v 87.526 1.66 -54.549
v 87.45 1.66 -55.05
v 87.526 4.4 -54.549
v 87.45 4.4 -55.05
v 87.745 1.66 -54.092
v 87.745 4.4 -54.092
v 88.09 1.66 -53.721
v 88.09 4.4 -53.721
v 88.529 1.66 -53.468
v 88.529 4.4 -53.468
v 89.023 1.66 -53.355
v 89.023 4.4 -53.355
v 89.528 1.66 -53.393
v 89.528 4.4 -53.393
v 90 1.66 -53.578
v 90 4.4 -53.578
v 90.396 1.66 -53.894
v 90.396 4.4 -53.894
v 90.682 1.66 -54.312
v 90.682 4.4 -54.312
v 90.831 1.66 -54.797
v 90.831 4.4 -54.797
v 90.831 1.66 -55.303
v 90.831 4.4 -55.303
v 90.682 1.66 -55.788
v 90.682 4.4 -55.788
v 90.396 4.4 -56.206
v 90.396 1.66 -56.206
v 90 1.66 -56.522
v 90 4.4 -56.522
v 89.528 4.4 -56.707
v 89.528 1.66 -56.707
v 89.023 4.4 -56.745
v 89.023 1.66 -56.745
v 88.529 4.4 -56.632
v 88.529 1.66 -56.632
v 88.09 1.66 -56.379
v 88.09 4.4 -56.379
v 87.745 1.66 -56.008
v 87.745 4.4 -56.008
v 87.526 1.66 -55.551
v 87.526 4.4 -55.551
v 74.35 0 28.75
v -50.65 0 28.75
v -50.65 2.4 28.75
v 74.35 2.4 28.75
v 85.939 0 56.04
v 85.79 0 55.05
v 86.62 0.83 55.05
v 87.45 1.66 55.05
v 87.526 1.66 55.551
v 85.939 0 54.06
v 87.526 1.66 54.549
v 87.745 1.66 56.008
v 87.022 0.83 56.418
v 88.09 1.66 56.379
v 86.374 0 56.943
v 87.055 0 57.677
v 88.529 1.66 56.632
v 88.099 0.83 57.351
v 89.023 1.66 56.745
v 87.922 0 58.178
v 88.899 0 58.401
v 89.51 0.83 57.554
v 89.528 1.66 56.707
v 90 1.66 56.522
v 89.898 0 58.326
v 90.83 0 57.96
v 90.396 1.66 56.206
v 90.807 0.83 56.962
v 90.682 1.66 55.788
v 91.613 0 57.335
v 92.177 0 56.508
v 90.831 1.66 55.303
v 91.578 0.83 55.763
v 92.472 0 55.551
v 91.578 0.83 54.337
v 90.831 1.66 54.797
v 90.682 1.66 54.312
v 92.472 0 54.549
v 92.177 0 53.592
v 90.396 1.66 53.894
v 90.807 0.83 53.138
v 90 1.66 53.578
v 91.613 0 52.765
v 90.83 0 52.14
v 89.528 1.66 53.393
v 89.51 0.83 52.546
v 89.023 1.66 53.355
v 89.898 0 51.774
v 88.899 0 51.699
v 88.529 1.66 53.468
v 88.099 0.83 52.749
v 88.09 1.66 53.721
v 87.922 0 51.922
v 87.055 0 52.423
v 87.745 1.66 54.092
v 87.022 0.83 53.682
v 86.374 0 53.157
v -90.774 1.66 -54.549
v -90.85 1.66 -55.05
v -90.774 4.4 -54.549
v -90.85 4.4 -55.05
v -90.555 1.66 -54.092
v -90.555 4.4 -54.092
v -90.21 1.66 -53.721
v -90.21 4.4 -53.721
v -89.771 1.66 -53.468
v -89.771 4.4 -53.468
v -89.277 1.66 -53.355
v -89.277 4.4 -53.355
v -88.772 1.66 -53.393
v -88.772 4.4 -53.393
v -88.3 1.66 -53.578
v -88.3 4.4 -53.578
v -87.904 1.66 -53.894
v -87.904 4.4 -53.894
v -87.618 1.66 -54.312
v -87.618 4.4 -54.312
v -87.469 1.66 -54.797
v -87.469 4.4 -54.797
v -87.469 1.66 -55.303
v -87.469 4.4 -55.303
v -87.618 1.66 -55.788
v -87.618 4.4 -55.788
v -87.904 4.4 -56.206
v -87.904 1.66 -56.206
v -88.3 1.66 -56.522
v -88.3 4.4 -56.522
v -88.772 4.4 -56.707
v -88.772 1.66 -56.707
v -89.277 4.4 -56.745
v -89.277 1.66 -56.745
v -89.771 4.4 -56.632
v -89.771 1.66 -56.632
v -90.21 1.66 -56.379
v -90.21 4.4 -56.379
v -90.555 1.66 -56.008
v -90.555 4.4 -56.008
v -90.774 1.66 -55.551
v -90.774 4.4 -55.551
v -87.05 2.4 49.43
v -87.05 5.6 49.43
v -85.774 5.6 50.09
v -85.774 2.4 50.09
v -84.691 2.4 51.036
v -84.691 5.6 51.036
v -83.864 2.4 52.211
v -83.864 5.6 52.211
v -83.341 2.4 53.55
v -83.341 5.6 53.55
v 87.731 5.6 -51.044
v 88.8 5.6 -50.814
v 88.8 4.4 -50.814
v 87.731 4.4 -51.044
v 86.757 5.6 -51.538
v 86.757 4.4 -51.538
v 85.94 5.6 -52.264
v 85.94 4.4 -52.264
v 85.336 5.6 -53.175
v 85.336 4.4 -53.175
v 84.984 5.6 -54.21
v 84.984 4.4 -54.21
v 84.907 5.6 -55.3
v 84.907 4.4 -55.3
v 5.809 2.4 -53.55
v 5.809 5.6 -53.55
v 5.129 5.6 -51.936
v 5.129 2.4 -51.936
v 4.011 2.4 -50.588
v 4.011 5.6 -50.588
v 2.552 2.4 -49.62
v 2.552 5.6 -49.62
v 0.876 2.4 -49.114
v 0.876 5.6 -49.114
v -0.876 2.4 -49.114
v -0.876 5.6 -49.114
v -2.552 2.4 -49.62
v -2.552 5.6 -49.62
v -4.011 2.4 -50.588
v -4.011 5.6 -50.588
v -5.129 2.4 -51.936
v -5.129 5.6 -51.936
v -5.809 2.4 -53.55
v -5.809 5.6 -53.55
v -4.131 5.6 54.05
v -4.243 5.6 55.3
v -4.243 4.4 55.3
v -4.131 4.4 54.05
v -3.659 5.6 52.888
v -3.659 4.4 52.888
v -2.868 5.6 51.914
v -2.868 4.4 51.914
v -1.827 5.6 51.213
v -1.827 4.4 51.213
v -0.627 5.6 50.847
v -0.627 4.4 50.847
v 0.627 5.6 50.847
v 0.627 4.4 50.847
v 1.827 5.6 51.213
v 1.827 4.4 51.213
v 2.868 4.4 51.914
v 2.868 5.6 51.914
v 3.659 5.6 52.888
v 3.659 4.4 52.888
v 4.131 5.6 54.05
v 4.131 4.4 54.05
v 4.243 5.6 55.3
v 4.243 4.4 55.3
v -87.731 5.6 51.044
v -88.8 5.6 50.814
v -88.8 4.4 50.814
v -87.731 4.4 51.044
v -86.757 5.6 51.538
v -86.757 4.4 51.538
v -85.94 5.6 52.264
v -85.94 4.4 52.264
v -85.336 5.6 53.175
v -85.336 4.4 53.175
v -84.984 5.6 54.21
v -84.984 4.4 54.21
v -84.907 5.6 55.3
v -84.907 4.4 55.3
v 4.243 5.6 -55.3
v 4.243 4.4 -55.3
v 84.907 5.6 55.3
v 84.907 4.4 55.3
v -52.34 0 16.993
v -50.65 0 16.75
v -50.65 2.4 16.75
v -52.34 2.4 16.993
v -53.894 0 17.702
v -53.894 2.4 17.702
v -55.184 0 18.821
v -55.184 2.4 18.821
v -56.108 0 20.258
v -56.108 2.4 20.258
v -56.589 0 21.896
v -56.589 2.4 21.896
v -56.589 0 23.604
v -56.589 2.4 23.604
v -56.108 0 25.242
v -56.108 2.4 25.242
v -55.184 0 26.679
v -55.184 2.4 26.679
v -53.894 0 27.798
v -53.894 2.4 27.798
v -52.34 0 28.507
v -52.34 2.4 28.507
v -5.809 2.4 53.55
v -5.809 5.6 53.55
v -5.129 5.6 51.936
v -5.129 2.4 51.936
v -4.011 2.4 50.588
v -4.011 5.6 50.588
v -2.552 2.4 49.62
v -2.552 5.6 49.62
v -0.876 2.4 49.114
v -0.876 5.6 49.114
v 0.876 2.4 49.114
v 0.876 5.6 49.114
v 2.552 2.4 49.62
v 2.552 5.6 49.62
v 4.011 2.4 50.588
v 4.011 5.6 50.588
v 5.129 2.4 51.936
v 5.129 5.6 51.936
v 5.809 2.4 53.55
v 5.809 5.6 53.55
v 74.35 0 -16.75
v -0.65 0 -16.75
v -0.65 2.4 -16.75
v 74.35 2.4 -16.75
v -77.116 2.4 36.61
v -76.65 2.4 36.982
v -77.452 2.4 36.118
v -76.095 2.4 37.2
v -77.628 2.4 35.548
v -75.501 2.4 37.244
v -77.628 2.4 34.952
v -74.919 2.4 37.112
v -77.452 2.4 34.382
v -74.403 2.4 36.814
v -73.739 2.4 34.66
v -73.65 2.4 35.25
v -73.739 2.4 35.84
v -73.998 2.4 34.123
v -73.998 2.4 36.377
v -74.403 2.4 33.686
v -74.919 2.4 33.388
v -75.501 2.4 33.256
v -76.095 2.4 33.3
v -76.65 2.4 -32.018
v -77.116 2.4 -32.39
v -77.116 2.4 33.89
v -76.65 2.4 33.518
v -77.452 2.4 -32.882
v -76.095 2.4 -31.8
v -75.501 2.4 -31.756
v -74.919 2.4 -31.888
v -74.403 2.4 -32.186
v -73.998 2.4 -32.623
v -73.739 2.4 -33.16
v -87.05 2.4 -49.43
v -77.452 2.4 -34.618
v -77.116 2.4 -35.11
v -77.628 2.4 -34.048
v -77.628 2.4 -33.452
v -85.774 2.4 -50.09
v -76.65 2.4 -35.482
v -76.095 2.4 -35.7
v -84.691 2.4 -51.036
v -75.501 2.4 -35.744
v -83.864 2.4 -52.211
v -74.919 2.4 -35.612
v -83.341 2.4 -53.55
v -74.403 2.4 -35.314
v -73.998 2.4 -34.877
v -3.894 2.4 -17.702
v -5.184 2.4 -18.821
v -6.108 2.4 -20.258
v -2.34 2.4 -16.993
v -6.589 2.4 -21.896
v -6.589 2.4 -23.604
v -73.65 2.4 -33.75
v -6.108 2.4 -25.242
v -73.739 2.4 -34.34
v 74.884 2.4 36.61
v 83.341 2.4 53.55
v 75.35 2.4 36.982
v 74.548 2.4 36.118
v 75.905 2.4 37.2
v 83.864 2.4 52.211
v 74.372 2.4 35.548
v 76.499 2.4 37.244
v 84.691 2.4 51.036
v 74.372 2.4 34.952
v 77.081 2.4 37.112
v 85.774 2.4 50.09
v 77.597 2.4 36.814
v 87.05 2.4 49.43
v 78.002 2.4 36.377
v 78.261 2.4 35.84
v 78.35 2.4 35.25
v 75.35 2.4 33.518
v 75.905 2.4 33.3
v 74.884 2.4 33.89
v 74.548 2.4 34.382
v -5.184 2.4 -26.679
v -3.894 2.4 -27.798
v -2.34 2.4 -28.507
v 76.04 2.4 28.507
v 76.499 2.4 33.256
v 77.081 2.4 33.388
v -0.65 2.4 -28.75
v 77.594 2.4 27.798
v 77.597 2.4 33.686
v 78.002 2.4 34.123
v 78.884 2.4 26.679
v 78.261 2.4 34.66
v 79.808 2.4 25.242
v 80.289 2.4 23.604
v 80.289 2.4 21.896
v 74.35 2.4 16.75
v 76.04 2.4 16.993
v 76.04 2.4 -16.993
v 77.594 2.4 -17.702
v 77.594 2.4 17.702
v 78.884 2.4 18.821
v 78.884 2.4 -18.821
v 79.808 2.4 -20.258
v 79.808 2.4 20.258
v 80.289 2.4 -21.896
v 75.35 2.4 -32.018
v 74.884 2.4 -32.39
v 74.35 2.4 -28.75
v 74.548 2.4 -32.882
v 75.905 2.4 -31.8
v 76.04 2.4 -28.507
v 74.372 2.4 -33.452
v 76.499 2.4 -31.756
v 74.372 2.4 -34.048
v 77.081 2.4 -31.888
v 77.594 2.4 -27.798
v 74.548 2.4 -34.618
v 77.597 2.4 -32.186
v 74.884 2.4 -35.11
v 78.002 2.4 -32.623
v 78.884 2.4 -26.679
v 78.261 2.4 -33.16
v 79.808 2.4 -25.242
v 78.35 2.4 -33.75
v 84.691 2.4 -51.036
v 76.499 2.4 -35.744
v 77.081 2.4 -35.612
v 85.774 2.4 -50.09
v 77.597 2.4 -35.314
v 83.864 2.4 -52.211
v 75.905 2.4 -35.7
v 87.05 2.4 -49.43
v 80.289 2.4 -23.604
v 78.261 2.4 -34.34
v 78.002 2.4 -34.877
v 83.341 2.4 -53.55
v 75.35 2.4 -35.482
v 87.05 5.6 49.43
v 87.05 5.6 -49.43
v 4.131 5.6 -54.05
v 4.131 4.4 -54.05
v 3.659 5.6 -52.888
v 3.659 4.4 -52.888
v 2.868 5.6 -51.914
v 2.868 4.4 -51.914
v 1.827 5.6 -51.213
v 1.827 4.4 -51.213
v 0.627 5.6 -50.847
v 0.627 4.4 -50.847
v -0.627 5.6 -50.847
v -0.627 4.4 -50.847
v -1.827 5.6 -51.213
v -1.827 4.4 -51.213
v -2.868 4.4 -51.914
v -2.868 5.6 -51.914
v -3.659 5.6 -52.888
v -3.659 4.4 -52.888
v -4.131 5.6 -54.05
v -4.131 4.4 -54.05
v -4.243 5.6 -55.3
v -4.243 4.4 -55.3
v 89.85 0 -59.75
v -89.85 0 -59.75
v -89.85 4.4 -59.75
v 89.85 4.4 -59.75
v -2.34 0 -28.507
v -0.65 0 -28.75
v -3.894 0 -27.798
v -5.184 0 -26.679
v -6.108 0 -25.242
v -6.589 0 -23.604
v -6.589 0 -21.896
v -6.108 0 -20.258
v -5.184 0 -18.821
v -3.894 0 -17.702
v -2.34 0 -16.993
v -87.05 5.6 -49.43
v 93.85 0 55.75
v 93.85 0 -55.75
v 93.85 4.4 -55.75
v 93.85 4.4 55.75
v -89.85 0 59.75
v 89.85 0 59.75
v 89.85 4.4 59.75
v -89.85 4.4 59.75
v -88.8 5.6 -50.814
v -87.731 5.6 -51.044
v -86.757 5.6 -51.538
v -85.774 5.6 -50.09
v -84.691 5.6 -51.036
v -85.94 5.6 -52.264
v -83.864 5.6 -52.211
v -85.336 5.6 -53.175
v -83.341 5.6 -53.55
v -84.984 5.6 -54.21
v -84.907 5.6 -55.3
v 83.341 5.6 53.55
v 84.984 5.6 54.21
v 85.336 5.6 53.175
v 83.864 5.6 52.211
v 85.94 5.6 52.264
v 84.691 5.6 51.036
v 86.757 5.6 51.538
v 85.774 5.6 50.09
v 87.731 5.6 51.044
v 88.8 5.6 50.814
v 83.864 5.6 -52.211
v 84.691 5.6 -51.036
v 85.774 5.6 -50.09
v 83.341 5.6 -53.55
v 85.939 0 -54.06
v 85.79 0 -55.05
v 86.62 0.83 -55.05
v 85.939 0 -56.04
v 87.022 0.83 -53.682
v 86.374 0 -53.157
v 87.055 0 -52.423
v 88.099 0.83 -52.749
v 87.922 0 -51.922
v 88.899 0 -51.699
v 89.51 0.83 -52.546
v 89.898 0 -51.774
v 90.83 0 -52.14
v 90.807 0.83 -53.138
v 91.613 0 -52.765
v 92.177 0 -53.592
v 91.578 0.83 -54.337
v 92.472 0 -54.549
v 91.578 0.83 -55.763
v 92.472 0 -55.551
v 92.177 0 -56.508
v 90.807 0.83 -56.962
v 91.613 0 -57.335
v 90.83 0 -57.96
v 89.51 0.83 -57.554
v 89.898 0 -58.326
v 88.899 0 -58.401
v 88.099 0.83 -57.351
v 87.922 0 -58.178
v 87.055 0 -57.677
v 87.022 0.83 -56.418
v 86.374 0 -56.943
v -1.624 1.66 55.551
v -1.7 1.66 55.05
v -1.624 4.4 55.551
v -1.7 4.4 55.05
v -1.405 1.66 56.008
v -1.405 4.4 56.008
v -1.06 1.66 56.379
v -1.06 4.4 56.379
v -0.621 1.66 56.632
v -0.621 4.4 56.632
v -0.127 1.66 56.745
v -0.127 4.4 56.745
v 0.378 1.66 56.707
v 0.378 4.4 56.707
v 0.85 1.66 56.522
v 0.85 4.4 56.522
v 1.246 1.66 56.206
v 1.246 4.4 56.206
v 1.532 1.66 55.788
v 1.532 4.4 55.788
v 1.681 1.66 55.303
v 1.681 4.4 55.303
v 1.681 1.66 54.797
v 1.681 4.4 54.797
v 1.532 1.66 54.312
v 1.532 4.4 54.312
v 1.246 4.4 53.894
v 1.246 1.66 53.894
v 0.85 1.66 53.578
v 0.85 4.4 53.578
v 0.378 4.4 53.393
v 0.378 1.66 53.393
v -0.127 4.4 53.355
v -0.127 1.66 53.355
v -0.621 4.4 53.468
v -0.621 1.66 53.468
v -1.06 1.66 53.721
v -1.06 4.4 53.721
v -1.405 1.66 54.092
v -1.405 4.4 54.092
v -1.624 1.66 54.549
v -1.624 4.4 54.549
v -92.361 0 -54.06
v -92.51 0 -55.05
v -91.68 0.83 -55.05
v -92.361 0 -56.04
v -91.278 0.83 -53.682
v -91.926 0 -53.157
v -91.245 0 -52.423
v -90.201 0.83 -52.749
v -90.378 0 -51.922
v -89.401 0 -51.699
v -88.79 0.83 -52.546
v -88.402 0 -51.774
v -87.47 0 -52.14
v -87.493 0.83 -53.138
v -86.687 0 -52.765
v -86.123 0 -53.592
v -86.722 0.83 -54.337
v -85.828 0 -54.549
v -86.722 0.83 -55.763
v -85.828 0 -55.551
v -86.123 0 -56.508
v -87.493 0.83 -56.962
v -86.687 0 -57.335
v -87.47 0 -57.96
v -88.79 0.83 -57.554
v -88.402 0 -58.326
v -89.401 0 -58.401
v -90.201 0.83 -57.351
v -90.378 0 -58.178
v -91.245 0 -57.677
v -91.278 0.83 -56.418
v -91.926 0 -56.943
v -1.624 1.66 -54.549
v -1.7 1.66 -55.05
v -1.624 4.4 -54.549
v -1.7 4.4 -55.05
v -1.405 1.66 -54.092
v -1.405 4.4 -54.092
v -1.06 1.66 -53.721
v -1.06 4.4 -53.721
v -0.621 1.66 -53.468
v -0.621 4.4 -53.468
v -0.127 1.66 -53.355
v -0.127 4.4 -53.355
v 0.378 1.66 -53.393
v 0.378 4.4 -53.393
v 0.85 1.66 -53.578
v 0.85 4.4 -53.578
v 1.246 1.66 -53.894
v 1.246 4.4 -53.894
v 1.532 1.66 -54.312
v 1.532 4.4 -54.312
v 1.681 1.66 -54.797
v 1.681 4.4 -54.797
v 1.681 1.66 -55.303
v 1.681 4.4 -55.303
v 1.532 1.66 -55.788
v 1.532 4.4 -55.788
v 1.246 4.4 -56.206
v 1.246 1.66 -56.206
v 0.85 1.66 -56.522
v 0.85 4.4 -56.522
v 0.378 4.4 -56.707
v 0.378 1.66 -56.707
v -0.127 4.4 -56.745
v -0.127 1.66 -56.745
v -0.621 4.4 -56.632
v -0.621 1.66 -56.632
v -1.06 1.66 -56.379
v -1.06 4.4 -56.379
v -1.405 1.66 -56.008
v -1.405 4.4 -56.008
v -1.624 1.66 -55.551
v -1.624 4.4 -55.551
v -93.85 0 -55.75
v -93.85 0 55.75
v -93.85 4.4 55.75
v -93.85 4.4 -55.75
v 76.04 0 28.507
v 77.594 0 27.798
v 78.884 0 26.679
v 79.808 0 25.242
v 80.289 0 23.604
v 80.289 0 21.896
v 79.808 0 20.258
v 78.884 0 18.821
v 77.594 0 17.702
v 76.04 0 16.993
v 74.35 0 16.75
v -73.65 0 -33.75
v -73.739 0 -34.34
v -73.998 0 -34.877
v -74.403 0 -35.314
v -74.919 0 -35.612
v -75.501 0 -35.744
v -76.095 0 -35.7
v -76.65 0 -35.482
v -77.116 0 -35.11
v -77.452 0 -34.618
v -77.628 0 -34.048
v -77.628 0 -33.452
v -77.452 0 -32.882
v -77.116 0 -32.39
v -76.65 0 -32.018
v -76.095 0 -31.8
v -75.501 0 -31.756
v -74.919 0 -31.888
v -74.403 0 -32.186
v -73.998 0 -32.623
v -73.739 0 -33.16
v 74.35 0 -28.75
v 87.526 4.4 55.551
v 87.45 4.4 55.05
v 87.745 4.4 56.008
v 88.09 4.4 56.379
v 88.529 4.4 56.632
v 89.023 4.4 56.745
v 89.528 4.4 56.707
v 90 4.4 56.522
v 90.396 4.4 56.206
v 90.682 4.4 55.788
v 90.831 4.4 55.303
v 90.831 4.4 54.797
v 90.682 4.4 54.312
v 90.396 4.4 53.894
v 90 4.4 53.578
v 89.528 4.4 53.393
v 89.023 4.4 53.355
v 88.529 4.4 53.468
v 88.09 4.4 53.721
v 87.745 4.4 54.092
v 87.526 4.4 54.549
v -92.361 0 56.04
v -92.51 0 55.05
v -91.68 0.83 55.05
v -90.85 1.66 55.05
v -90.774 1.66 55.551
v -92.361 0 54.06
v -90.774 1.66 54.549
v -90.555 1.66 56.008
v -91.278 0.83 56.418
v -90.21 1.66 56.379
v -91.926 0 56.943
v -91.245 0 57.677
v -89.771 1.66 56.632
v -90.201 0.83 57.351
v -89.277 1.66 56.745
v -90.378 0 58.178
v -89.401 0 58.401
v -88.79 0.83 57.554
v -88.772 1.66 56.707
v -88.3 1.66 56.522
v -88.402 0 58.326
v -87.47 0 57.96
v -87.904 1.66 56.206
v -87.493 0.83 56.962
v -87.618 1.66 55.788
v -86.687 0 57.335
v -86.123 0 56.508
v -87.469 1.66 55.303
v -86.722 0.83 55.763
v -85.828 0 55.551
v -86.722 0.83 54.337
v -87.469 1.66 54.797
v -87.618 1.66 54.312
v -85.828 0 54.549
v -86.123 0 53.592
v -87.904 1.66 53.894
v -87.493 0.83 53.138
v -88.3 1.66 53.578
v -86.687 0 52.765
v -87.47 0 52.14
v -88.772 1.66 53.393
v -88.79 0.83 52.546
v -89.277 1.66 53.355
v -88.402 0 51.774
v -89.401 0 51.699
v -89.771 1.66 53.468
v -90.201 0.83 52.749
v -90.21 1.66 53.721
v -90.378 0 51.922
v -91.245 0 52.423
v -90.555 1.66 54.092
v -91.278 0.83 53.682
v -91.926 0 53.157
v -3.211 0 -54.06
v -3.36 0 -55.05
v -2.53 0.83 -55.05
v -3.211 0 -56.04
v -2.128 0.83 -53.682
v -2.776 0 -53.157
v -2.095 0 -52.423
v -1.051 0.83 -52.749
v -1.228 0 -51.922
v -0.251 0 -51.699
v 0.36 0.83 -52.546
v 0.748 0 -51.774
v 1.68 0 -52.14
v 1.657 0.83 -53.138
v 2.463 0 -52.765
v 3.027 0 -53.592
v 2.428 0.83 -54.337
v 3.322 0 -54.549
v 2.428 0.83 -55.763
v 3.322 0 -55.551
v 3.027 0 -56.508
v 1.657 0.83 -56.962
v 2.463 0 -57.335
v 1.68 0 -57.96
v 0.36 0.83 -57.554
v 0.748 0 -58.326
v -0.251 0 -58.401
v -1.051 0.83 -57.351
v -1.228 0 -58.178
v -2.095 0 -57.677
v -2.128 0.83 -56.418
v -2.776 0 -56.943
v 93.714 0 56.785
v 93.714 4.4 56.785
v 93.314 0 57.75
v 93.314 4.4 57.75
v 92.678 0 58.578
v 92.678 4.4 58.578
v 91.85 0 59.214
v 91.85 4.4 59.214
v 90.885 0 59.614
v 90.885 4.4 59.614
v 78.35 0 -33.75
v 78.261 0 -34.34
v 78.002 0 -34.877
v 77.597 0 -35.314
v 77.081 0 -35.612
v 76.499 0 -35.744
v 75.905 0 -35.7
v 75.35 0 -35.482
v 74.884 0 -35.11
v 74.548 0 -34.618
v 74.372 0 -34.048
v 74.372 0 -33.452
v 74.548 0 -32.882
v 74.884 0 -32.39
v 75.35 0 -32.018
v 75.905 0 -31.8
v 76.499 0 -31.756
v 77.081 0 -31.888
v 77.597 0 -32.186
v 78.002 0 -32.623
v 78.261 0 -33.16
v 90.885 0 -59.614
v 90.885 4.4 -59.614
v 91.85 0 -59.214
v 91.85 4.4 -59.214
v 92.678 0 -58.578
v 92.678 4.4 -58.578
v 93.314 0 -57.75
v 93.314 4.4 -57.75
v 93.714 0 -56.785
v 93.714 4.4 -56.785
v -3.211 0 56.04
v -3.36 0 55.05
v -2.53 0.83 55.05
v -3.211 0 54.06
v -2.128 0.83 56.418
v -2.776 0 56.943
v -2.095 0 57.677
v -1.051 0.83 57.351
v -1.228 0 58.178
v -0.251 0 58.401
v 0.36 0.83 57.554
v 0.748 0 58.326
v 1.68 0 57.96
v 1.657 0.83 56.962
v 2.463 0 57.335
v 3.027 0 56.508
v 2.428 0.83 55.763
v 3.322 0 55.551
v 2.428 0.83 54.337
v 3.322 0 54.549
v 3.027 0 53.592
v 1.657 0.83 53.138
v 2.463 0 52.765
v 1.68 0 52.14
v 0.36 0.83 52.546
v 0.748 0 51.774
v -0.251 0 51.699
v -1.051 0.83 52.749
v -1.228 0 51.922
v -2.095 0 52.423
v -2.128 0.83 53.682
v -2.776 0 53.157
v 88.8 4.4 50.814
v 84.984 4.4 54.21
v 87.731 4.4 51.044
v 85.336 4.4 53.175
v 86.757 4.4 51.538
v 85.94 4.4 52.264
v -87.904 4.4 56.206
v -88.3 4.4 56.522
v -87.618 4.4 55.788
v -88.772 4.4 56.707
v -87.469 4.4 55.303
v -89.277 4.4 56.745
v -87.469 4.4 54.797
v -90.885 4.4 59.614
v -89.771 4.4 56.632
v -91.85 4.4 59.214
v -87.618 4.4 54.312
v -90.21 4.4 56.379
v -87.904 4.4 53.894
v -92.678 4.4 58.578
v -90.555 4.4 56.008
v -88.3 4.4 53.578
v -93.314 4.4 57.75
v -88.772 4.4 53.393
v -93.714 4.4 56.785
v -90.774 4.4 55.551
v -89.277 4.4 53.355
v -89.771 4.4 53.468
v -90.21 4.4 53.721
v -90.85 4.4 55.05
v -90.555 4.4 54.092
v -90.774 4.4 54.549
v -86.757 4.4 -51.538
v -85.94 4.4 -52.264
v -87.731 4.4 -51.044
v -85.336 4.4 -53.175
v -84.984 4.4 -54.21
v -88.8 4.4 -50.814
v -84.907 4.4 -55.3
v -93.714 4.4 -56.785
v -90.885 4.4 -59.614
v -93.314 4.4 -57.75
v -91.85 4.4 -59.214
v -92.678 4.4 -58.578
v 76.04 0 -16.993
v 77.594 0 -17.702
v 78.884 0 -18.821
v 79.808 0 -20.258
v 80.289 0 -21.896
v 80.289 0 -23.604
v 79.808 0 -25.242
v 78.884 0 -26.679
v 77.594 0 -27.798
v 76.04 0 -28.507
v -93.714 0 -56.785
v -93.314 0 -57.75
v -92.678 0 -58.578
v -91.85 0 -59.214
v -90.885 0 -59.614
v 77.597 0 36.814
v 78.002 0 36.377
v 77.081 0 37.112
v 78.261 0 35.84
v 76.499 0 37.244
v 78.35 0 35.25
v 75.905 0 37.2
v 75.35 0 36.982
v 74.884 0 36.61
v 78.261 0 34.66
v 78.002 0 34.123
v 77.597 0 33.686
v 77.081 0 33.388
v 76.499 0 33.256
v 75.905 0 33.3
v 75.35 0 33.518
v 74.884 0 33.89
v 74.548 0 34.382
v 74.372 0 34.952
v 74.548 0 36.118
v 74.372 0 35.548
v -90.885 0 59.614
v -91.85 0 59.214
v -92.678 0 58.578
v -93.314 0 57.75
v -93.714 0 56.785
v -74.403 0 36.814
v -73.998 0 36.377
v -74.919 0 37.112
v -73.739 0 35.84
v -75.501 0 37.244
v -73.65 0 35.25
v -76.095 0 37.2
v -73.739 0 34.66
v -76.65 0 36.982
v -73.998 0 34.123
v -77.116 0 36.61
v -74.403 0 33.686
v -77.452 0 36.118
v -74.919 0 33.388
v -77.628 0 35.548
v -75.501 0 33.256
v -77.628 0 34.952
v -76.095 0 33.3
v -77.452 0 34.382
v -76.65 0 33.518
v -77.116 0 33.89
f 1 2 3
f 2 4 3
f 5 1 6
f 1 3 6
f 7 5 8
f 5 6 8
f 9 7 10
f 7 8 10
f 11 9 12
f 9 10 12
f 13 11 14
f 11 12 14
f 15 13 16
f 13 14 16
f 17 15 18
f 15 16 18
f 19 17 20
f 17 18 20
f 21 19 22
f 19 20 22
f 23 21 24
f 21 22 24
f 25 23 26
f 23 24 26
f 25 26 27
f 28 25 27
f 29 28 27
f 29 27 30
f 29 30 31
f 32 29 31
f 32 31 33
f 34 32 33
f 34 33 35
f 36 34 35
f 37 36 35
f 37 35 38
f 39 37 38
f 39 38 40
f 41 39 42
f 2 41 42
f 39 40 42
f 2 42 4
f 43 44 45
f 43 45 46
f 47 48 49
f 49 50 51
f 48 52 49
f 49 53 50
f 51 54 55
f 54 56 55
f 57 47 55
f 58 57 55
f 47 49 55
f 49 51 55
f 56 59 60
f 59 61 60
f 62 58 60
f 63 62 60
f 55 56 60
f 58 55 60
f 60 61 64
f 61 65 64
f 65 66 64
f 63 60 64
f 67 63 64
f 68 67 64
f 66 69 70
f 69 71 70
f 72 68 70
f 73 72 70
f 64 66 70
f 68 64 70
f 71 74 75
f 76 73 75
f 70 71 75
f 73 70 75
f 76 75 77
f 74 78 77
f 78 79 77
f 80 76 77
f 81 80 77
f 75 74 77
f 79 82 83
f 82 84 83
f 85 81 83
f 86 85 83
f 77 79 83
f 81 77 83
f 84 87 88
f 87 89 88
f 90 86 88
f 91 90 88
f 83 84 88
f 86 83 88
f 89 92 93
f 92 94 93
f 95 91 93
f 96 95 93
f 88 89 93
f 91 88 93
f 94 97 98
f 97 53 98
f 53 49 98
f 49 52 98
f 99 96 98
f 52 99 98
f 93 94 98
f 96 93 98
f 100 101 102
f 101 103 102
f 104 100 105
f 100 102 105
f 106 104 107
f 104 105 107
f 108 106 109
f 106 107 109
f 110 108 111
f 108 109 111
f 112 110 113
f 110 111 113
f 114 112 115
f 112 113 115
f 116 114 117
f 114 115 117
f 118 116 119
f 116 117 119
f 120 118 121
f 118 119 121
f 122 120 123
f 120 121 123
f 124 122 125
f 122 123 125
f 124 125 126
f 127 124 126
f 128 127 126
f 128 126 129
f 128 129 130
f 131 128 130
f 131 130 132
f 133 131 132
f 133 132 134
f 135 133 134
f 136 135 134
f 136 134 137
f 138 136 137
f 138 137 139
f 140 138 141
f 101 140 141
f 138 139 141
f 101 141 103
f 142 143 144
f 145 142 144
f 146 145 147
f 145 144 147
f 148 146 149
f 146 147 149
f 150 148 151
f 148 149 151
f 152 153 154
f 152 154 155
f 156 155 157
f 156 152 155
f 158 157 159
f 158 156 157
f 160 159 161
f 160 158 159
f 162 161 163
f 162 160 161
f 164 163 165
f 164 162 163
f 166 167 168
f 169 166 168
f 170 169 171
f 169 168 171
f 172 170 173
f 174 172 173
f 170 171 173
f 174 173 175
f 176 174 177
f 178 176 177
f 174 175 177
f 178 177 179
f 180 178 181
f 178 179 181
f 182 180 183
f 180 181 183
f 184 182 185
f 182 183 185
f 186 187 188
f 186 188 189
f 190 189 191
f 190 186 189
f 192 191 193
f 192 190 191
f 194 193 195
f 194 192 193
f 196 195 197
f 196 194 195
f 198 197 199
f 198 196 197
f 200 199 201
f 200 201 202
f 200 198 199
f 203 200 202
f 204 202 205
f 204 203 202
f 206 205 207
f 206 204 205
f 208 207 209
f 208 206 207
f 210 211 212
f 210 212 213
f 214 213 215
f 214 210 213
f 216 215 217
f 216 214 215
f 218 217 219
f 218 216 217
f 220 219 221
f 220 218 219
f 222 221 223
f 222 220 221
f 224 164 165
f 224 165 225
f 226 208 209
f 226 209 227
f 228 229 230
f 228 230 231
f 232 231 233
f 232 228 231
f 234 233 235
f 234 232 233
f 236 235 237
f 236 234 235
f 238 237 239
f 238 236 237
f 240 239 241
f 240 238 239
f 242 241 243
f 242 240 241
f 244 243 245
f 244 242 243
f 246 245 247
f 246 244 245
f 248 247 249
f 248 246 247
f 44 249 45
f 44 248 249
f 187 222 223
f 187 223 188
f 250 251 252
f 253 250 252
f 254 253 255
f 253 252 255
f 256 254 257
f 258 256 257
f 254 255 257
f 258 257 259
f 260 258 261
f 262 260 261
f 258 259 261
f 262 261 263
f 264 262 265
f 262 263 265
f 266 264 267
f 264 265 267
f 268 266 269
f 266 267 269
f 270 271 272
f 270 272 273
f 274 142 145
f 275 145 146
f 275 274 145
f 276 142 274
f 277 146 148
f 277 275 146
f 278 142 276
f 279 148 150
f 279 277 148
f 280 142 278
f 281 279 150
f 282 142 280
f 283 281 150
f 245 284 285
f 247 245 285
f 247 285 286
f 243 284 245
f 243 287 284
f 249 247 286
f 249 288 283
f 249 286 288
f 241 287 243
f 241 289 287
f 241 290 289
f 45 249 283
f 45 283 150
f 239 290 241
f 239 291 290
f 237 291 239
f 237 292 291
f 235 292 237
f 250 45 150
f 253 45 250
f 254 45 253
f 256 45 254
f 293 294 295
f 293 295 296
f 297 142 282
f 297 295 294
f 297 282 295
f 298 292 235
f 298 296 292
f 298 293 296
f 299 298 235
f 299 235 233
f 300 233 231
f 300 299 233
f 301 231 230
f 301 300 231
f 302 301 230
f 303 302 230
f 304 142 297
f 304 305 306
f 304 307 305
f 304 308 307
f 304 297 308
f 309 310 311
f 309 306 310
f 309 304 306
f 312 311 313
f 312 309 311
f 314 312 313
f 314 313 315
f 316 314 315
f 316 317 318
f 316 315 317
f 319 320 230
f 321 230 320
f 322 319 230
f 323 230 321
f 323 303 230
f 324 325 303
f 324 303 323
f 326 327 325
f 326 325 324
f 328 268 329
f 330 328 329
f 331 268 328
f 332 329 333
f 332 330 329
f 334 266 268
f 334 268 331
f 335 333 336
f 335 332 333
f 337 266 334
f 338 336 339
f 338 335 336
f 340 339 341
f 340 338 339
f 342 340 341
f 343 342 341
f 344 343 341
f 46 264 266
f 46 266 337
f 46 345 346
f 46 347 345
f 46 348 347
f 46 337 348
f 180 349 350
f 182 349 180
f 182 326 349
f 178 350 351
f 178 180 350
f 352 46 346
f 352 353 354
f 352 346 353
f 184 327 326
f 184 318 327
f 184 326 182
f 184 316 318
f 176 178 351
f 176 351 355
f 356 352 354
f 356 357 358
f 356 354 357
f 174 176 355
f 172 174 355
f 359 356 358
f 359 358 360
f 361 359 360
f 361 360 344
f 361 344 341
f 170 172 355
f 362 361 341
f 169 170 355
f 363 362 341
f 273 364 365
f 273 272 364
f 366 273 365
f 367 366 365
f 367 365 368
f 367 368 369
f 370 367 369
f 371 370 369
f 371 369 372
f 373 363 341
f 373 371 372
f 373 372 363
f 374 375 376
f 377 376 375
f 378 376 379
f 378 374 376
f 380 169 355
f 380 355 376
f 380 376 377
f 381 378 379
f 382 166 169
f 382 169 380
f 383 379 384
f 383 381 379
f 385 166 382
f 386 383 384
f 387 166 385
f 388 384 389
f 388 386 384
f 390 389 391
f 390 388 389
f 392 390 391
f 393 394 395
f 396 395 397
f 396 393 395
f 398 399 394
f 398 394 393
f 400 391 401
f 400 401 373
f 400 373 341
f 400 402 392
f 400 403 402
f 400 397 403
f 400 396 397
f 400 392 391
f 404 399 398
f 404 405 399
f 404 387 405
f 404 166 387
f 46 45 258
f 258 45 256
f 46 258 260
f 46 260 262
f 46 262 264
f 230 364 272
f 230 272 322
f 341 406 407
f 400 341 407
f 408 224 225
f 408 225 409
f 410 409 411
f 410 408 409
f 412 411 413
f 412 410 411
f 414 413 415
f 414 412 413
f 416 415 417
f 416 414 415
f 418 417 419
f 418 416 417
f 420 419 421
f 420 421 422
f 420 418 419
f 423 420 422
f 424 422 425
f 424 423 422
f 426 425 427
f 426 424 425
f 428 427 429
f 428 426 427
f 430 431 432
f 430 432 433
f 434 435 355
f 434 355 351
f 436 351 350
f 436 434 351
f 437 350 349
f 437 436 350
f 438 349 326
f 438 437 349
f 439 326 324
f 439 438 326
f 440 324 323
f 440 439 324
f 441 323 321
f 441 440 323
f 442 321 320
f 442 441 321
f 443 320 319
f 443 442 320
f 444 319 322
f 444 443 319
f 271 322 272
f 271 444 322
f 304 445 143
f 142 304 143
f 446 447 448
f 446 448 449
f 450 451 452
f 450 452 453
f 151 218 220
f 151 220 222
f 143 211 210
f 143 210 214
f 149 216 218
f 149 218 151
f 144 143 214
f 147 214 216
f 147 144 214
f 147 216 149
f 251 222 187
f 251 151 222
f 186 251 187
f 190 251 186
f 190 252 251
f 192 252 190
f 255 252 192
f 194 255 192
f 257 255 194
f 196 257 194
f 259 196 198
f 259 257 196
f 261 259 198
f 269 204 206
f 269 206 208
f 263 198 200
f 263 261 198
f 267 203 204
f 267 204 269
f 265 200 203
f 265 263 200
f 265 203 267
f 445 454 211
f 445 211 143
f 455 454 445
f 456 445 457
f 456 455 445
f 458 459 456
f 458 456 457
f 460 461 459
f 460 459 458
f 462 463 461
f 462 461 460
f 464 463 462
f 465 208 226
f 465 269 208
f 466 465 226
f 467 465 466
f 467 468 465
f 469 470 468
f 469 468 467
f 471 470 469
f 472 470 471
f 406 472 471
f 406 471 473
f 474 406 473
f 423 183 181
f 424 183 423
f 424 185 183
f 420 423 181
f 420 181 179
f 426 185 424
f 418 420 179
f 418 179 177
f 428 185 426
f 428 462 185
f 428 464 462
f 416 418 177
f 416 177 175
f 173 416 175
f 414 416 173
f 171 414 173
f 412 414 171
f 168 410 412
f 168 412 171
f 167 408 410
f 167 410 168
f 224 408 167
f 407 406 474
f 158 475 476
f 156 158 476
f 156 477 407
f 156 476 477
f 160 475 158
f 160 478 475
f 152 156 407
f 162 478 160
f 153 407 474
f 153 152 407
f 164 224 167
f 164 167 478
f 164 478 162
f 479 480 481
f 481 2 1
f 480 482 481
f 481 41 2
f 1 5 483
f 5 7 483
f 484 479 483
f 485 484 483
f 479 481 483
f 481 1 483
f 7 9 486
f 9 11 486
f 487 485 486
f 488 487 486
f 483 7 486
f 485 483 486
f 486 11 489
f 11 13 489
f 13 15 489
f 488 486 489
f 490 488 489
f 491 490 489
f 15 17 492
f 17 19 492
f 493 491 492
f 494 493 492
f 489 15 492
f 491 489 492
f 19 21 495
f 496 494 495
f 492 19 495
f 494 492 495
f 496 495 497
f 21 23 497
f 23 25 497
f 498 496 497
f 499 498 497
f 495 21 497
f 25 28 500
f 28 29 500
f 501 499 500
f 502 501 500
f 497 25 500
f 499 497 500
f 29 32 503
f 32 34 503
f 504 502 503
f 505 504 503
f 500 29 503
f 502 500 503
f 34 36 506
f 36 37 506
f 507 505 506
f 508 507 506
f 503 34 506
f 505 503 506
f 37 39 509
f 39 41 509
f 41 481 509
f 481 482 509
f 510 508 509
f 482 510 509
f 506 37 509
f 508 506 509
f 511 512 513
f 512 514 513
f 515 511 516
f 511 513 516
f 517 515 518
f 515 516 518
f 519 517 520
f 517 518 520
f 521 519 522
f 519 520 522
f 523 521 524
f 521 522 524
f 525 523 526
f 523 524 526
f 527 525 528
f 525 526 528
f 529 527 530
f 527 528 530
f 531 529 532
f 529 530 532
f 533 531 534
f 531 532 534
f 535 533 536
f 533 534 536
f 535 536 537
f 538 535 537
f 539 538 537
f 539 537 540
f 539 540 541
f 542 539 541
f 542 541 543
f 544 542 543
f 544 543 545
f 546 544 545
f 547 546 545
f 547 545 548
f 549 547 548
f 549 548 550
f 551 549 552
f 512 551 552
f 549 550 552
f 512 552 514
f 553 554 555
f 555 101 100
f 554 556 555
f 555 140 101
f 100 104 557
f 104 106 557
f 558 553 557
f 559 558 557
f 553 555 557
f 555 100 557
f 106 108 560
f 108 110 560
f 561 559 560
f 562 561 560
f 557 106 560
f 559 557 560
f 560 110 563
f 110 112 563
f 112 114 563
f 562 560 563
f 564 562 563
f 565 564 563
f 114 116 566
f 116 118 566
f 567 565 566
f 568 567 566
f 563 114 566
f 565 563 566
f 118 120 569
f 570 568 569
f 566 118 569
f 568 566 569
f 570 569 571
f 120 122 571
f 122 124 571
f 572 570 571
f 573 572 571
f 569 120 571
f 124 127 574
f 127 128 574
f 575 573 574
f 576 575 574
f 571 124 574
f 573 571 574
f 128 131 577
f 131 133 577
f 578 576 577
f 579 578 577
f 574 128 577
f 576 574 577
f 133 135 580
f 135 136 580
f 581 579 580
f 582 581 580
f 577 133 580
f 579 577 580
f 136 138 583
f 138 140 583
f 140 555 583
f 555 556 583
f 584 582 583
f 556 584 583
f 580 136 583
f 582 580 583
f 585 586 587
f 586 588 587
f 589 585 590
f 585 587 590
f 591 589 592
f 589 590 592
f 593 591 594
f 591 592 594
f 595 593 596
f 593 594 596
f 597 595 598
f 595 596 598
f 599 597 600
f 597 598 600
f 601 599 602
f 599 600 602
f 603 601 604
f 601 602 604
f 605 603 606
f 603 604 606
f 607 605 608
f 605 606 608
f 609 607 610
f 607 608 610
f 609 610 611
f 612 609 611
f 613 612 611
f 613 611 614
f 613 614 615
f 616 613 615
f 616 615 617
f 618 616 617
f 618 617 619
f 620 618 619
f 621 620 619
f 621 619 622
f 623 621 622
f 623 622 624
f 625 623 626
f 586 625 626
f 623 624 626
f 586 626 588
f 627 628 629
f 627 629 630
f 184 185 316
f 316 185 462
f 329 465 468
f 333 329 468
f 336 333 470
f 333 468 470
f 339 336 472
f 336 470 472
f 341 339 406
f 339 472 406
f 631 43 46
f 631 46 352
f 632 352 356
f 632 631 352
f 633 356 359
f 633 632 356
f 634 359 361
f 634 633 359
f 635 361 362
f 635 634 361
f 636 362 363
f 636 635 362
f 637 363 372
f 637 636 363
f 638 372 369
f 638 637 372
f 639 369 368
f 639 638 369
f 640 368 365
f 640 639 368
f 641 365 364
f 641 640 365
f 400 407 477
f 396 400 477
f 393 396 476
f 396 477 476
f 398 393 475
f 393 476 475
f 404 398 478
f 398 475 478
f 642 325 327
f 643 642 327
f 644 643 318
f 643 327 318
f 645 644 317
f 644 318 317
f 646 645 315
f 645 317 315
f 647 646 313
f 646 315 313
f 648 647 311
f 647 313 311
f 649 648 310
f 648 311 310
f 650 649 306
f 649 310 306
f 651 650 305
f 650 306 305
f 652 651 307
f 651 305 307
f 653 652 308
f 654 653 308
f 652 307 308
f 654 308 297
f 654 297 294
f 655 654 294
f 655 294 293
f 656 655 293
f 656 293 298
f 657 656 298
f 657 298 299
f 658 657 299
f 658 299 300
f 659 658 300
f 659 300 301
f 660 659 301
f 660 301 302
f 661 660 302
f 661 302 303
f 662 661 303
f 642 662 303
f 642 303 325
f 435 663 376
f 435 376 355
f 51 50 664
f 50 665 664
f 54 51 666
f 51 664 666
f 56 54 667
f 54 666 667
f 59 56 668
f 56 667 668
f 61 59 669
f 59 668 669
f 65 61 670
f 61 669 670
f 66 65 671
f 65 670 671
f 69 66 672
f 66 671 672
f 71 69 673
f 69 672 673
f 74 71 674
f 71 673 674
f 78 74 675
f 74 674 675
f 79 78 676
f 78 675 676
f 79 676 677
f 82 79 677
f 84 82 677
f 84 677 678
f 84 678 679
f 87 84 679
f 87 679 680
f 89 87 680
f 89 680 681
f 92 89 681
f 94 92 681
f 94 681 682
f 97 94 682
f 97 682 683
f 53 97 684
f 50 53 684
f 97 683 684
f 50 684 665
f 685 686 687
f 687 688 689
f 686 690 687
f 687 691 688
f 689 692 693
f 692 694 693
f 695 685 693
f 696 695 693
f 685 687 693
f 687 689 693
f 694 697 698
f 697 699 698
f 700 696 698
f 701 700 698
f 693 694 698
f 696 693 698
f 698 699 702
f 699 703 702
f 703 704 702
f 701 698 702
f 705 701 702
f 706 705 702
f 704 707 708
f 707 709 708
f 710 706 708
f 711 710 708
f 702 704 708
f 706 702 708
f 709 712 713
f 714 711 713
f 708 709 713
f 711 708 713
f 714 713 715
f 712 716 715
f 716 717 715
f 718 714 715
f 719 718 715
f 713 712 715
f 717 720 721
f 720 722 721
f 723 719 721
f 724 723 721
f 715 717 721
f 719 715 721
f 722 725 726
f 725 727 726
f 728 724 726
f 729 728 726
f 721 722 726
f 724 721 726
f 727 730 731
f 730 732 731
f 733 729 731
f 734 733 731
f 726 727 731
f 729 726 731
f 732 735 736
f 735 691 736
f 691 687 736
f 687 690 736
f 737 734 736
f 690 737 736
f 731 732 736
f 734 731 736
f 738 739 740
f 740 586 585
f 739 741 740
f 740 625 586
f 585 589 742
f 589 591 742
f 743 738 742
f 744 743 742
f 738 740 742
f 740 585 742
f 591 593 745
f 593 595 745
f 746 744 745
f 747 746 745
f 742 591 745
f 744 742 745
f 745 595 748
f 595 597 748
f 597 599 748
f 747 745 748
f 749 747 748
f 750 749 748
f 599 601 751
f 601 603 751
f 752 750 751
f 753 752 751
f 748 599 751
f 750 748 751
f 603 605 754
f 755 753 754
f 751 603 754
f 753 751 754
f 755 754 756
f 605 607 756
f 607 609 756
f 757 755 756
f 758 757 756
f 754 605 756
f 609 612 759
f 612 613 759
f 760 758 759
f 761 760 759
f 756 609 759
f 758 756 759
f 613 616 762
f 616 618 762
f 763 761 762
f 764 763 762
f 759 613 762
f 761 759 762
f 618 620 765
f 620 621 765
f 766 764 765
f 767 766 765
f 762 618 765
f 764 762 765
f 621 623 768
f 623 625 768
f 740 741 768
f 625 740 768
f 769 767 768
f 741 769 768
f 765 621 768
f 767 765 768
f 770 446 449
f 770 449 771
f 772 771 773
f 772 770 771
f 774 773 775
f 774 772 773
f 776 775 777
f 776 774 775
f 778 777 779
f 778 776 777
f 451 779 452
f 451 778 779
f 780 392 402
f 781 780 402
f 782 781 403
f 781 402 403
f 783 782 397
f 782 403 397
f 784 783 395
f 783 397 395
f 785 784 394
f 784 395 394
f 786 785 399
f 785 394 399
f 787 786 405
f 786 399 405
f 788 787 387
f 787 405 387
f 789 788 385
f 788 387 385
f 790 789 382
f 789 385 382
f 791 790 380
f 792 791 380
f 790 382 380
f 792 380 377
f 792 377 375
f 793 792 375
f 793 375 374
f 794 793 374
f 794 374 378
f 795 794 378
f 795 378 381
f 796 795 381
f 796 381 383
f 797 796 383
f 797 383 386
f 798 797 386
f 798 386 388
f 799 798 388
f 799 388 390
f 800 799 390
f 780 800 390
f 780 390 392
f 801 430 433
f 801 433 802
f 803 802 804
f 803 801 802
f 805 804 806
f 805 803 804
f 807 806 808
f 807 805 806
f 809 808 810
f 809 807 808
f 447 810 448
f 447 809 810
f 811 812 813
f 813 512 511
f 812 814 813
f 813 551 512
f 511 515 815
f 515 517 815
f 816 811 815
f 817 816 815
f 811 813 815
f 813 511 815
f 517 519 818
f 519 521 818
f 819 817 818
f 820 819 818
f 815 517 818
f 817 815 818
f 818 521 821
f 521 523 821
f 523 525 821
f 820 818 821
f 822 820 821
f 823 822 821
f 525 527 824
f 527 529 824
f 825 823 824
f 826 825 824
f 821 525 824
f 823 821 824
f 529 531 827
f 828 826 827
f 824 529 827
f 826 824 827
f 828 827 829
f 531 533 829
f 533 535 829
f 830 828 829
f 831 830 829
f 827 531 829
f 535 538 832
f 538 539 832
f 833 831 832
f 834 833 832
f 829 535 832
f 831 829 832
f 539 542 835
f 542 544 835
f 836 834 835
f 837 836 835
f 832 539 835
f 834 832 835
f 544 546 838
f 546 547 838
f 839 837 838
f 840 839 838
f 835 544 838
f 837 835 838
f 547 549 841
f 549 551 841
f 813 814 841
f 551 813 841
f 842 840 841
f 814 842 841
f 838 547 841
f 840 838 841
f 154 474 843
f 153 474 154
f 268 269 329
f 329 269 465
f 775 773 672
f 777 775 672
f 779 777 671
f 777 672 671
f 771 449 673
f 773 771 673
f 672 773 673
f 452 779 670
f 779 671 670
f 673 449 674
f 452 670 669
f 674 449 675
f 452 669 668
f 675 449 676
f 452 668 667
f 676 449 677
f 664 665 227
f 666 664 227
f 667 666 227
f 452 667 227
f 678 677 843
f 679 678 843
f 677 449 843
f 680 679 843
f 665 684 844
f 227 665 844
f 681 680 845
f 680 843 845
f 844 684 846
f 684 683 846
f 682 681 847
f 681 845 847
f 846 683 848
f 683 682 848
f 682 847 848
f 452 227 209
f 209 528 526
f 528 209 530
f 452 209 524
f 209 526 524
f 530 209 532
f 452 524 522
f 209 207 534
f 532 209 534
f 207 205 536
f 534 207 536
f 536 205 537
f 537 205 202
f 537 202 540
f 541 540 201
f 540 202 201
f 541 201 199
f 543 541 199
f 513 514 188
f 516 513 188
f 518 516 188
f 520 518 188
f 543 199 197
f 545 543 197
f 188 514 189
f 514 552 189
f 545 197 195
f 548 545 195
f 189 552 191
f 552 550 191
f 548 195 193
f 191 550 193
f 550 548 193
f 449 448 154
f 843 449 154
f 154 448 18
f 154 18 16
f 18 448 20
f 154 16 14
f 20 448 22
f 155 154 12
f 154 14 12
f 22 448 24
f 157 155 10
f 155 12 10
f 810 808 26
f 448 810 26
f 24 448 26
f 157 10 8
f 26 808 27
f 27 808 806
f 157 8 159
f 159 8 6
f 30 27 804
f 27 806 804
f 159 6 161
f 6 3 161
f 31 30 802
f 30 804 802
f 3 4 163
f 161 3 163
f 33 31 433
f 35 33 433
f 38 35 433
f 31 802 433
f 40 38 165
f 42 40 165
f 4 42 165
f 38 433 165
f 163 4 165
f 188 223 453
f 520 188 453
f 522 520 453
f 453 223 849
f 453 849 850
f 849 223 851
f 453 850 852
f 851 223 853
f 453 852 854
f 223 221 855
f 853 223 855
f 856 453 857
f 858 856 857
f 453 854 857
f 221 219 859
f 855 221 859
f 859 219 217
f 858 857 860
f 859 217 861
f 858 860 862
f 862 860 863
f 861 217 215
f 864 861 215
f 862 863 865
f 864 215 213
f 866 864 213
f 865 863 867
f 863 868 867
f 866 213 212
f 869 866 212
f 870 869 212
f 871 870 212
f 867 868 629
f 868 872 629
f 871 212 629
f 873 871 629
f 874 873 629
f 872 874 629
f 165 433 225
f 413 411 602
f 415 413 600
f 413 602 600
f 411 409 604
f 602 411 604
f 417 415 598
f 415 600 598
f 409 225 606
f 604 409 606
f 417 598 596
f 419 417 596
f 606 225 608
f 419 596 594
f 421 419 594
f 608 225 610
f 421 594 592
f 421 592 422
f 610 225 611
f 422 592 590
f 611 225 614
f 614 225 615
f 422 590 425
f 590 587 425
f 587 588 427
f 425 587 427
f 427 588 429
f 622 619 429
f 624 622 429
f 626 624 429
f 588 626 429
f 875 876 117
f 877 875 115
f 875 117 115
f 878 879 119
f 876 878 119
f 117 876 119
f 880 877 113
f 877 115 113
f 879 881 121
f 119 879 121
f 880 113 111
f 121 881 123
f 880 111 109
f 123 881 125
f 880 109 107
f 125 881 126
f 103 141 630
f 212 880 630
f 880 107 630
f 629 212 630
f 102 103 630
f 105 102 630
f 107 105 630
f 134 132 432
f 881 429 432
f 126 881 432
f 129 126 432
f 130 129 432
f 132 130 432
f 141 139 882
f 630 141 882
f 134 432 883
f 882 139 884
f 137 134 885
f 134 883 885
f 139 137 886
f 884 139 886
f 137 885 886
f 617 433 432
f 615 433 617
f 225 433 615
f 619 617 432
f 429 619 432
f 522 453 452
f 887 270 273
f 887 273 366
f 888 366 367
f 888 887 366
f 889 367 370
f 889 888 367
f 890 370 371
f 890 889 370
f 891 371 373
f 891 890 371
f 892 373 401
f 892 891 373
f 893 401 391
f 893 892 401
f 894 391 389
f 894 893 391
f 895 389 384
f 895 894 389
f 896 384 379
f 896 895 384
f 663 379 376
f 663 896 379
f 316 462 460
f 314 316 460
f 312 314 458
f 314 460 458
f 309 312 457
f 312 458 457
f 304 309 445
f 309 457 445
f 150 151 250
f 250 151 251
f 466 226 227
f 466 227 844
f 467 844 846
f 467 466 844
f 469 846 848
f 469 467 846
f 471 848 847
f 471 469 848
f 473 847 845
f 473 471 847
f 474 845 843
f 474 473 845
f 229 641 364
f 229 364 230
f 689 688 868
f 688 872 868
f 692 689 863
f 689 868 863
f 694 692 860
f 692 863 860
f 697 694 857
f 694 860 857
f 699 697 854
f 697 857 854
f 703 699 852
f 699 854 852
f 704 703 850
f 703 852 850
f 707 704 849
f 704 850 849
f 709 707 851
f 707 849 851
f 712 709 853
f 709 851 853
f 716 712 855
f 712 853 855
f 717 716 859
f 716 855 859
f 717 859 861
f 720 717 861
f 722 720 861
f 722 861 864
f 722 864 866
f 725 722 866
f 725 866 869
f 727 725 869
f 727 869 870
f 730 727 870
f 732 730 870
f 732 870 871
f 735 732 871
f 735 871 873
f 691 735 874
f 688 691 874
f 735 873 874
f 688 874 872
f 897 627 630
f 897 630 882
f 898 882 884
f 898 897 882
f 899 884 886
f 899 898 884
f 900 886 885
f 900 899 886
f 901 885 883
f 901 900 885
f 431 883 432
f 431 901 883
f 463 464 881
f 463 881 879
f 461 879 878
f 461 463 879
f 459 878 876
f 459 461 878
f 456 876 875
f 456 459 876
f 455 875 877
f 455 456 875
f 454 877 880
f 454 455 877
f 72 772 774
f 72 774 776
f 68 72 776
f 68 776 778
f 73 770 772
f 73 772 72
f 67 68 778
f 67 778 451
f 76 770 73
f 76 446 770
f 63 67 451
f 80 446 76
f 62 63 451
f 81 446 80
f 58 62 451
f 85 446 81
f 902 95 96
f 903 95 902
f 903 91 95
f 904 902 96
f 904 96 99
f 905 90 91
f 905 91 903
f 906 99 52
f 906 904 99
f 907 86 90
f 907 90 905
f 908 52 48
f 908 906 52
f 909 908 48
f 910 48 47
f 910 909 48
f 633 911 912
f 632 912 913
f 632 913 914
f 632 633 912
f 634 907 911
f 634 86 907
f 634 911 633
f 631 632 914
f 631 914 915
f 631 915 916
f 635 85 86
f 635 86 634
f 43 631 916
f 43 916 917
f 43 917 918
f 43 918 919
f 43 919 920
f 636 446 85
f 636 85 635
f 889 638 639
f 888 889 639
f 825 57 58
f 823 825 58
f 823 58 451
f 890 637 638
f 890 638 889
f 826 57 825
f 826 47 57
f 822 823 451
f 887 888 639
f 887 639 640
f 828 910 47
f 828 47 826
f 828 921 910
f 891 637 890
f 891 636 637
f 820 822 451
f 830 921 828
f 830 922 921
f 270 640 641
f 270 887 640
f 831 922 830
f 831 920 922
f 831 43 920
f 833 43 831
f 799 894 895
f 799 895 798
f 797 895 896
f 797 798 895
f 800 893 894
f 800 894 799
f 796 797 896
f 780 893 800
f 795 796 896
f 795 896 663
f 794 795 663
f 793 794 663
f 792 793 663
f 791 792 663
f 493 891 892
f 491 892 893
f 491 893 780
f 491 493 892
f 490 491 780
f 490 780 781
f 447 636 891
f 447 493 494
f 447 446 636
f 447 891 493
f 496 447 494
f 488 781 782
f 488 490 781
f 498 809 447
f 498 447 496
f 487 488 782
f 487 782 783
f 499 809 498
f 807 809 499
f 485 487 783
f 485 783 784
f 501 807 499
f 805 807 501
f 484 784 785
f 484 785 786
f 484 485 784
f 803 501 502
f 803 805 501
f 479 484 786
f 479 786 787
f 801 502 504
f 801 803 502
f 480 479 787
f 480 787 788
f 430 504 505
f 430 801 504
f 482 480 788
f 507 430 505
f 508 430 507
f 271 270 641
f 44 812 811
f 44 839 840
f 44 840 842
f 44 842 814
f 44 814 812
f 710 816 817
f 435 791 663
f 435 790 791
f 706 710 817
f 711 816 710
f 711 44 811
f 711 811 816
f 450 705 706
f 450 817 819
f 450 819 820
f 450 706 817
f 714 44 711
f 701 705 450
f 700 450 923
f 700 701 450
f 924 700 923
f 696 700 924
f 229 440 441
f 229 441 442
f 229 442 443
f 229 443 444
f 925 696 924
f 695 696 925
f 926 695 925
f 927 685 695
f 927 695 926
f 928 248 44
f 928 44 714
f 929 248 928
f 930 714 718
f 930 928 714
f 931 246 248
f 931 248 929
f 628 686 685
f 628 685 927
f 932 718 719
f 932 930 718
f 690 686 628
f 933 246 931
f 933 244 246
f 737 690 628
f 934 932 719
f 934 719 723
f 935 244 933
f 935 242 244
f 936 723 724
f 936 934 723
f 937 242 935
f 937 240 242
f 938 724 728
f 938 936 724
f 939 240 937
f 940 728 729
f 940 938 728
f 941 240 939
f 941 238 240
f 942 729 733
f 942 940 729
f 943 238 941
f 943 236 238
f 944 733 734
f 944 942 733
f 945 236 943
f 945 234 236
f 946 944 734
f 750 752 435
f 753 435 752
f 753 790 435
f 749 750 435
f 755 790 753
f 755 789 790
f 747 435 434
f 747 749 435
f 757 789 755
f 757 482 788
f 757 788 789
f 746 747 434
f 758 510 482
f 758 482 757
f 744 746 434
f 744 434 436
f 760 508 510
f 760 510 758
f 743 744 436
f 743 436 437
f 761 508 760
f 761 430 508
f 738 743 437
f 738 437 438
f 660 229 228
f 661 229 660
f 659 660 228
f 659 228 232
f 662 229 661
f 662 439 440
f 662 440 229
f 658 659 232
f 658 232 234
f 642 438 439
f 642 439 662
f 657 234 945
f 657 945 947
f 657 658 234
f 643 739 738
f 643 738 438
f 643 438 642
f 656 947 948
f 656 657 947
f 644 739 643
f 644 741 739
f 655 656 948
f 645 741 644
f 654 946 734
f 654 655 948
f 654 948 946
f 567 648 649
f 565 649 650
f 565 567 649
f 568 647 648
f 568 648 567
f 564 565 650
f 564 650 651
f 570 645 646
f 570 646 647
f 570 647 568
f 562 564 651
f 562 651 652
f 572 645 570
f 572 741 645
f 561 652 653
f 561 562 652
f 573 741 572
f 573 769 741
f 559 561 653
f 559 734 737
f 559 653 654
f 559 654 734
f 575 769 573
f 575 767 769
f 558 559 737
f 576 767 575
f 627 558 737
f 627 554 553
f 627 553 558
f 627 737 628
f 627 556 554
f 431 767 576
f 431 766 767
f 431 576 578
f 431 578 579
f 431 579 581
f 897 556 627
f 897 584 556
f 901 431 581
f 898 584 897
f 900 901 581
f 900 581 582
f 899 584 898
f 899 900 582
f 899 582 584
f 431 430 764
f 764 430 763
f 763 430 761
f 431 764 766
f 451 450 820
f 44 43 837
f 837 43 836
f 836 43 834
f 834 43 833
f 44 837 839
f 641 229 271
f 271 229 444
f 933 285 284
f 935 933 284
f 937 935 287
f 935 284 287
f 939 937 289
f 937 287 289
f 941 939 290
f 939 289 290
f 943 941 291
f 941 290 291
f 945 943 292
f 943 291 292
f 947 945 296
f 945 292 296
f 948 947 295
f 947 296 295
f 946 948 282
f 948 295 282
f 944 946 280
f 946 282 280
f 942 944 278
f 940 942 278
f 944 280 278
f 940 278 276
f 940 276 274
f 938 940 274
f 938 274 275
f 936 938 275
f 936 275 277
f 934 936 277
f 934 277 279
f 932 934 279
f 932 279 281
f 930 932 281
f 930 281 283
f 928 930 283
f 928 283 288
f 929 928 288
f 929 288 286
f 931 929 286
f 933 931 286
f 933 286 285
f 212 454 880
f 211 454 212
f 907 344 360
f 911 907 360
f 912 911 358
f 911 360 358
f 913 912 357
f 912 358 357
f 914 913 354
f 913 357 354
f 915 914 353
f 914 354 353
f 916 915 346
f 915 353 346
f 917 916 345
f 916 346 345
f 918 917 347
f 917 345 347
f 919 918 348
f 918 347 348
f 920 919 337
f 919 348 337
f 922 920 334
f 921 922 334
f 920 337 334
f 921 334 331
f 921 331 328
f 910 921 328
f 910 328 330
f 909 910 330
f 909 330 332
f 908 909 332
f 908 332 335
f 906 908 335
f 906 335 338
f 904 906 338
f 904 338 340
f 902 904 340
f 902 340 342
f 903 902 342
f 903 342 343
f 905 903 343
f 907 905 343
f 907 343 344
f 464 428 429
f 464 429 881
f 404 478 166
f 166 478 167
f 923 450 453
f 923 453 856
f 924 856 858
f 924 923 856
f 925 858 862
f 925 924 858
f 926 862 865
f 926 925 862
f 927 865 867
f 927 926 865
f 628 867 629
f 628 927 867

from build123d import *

# Parameters (mm, degrees)
BOSS_EXTRUDE1_DEPTH           = 4.4
CUT_EXTRUDE1_DEPTH            = 2
BOSS_EXTRUDE3_START           = 1.2
BOSS_EXTRUDE3_DEPTH           = 1.2
CSK_FOR_M3_SFHCS1_D           = 3.4
CSK_FOR_M3_SFHCS1_CSINK_D     = 6.72
CSK_FOR_M3_SFHCS1_CSINK_ANGLE = 90
CUT_EXTRUDE2_DEPTH            = 112.396790798
F_4_0_4_DIAMETER_HOLE1_D      = 4


with BuildPart() as part:
    # Sketch1 → Boss-Extrude1 (new body)
    with BuildSketch(Plane(origin=(0, 0, 0), x_dir=(1, 0, 0), z_dir=(0, 1, 0))):
        with BuildLine():
            Line((-89.85, 59.75), (89.85, 59.75))
            ThreePointArc((89.85, 59.75), (92.678427125, 58.578427125), (93.85, 55.75))
            Line((93.85, 55.75), (93.85, -55.75))
            ThreePointArc((93.85, -55.75), (92.678427125, -58.578427125), (89.85, -59.75))
            Line((89.85, -59.75), (-89.85, -59.75))
            ThreePointArc((-89.85, -59.75), (-92.678427125, -58.578427125), (-93.85, -55.75))
            Line((-93.85, -55.75), (-93.85, 55.75))
            ThreePointArc((-93.85, 55.75), (-92.678427125, 58.578427125), (-89.85, 59.75))
        make_face()
    extrude(amount=BOSS_EXTRUDE1_DEPTH)

    # Sketch2 → Cut-Extrude1 (cut)
    with BuildSketch(Plane(origin=(0, 4.4, 0), x_dir=(1, 0, 0), z_dir=(0, 1, 0))):
        with BuildLine():
            Line((-83.340524981, -53.55), (-5.809475019, -53.55))
            ThreePointArc((-5.809475019, -53.55), (0, -49.05), (5.809475019, -53.55))
            Line((5.809475019, -53.55), (83.340524981, -53.55))
            ThreePointArc((83.340524981, -53.55), (84.690787612, -51.035597818), (87.05, -49.429501801))
            Line((87.05, -49.429501801), (87.05, 49.429501801))
            ThreePointArc((87.05, 49.429501801), (84.690787612, 51.035597818), (83.340524981, 53.55))
            Line((83.340524981, 53.55), (5.809475019, 53.55))
            ThreePointArc((5.809475019, 53.55), (0, 49.05), (-5.809475019, 53.55))
            Line((-5.809475019, 53.55), (-83.340524981, 53.55))
            ThreePointArc((-83.340524981, 53.55), (-84.690787612, 51.035597818), (-87.05, 49.429501801))
            Line((-87.05, 49.429501801), (-87.05, -49.429501801))
            ThreePointArc((-87.05, -49.429501801), (-84.690787612, -51.035597818), (-83.340524981, -53.55))
        make_face()
    extrude(amount=-CUT_EXTRUDE1_DEPTH, mode=Mode.SUBTRACT)

    # Sketch3 → Boss-Extrude3 (add)
    with BuildSketch(Plane(origin=(0, 4.4, 0), x_dir=(1, 0, 0), z_dir=(0, 1, 0)).offset(BOSS_EXTRUDE3_START)):
        with BuildLine():
            Line((-88.8, 50.814436283), (-88.8, -50.814436283))
            ThreePointArc((-88.8, -50.814436283), (-85.940146797, -52.264440377), (-84.907359313, -55.3))
            Line((-84.907359313, -55.3), (-4.242640687, -55.3))
            ThreePointArc((-4.242640687, -55.3), (0, -50.8), (4.242640687, -55.3))
            Line((4.242640687, -55.3), (84.907359313, -55.3))
            ThreePointArc((84.907359313, -55.3), (85.940146797, -52.264440377), (88.8, -50.814436283))
            Line((88.8, -50.814436283), (88.8, 50.814436283))
            ThreePointArc((88.8, 50.814436283), (85.940146797, 52.264440377), (84.907359313, 55.3))
            Line((84.907359313, 55.3), (4.242640687, 55.3))
            ThreePointArc((4.242640687, 55.3), (0, 50.8), (-4.242640687, 55.3))
            Line((-4.242640687, 55.3), (-84.907359313, 55.3))
            ThreePointArc((-84.907359313, 55.3), (-85.940146797, 52.264440377), (-88.8, 50.814436283))
        make_face()
        with BuildLine():
            Line((-87.05, 49.429501801), (-87.05, -49.429501801))
            ThreePointArc((-87.05, -49.429501801), (-84.690787612, -51.035597818), (-83.340524981, -53.55))
            Line((-83.340524981, -53.55), (-5.809475019, -53.55))
            ThreePointArc((-5.809475019, -53.55), (0, -49.05), (5.809475019, -53.55))
            Line((5.809475019, -53.55), (83.340524981, -53.55))
            ThreePointArc((83.340524981, -53.55), (84.690787612, -51.035597818), (87.05, -49.429501801))
            Line((87.05, -49.429501801), (87.05, 49.429501801))
            ThreePointArc((87.05, 49.429501801), (84.690787612, 51.035597818), (83.340524981, 53.55))
            Line((83.340524981, 53.55), (5.809475019, 53.55))
            ThreePointArc((5.809475019, 53.55), (0, 49.05), (-5.809475019, 53.55))
            Line((-5.809475019, 53.55), (-83.340524981, 53.55))
            ThreePointArc((-83.340524981, 53.55), (-84.690787612, 51.035597818), (-87.05, 49.429501801))
        make_face(mode=Mode.SUBTRACT)
    extrude(amount=-BOSS_EXTRUDE3_DEPTH)

    # CSK for M3 SFHCS1 (through all)
    with Locations(Plane(origin=(-54.95207322, 0, 58.575897403), x_dir=(1, 0, 0), z_dir=(0, -1, 0))):
        with Locations((-34.19792678, -113.625897403), (-34.19792678, -3.525897403), (144.10207322, -3.525897403), (144.10207322, -113.625897403), (54.95207322, -3.525897403), (54.95207322, -113.625897403)):
            CounterSinkHole(CSK_FOR_M3_SFHCS1_D / 2, CSK_FOR_M3_SFHCS1_CSINK_D / 2, counter_sink_angle=CSK_FOR_M3_SFHCS1_CSINK_ANGLE)

    # Sketch8 → Cut-Extrude2 (cut, through all)
    with BuildSketch(Plane.XZ):
        with BuildLine():
            Line((-0.65, -16.75), (74.35, -16.75))
            ThreePointArc((74.35, -16.75), (80.35, -22.75), (74.35, -28.75))
            Line((74.35, -28.75), (-0.65, -28.75))
            ThreePointArc((-0.65, -28.75), (-6.65, -22.75), (-0.65, -16.75))
        make_face()
        with BuildLine():
            Line((-50.65, 28.75), (74.35, 28.75))
            ThreePointArc((74.35, 28.75), (80.35, 22.75), (74.35, 16.75))
            Line((74.35, 16.75), (-50.65, 16.75))
            ThreePointArc((-50.65, 16.75), (-56.65, 22.75), (-50.65, 28.75))
        make_face()
    extrude(amount=-CUT_EXTRUDE2_DEPTH, mode=Mode.SUBTRACT)

    # Ø4.0 (4) Diameter Hole1 (through all)
    with Locations(Plane(origin=(0, 0, 0), x_dir=(-1, 0, 0), z_dir=(0, -1, 0))):
        with Locations((75.65, -35.25), (75.65, 33.75), (-76.35, 33.75), (-76.35, -35.25)):
            Hole(F_4_0_4_DIAMETER_HOLE1_D / 2)


solid = part.part
